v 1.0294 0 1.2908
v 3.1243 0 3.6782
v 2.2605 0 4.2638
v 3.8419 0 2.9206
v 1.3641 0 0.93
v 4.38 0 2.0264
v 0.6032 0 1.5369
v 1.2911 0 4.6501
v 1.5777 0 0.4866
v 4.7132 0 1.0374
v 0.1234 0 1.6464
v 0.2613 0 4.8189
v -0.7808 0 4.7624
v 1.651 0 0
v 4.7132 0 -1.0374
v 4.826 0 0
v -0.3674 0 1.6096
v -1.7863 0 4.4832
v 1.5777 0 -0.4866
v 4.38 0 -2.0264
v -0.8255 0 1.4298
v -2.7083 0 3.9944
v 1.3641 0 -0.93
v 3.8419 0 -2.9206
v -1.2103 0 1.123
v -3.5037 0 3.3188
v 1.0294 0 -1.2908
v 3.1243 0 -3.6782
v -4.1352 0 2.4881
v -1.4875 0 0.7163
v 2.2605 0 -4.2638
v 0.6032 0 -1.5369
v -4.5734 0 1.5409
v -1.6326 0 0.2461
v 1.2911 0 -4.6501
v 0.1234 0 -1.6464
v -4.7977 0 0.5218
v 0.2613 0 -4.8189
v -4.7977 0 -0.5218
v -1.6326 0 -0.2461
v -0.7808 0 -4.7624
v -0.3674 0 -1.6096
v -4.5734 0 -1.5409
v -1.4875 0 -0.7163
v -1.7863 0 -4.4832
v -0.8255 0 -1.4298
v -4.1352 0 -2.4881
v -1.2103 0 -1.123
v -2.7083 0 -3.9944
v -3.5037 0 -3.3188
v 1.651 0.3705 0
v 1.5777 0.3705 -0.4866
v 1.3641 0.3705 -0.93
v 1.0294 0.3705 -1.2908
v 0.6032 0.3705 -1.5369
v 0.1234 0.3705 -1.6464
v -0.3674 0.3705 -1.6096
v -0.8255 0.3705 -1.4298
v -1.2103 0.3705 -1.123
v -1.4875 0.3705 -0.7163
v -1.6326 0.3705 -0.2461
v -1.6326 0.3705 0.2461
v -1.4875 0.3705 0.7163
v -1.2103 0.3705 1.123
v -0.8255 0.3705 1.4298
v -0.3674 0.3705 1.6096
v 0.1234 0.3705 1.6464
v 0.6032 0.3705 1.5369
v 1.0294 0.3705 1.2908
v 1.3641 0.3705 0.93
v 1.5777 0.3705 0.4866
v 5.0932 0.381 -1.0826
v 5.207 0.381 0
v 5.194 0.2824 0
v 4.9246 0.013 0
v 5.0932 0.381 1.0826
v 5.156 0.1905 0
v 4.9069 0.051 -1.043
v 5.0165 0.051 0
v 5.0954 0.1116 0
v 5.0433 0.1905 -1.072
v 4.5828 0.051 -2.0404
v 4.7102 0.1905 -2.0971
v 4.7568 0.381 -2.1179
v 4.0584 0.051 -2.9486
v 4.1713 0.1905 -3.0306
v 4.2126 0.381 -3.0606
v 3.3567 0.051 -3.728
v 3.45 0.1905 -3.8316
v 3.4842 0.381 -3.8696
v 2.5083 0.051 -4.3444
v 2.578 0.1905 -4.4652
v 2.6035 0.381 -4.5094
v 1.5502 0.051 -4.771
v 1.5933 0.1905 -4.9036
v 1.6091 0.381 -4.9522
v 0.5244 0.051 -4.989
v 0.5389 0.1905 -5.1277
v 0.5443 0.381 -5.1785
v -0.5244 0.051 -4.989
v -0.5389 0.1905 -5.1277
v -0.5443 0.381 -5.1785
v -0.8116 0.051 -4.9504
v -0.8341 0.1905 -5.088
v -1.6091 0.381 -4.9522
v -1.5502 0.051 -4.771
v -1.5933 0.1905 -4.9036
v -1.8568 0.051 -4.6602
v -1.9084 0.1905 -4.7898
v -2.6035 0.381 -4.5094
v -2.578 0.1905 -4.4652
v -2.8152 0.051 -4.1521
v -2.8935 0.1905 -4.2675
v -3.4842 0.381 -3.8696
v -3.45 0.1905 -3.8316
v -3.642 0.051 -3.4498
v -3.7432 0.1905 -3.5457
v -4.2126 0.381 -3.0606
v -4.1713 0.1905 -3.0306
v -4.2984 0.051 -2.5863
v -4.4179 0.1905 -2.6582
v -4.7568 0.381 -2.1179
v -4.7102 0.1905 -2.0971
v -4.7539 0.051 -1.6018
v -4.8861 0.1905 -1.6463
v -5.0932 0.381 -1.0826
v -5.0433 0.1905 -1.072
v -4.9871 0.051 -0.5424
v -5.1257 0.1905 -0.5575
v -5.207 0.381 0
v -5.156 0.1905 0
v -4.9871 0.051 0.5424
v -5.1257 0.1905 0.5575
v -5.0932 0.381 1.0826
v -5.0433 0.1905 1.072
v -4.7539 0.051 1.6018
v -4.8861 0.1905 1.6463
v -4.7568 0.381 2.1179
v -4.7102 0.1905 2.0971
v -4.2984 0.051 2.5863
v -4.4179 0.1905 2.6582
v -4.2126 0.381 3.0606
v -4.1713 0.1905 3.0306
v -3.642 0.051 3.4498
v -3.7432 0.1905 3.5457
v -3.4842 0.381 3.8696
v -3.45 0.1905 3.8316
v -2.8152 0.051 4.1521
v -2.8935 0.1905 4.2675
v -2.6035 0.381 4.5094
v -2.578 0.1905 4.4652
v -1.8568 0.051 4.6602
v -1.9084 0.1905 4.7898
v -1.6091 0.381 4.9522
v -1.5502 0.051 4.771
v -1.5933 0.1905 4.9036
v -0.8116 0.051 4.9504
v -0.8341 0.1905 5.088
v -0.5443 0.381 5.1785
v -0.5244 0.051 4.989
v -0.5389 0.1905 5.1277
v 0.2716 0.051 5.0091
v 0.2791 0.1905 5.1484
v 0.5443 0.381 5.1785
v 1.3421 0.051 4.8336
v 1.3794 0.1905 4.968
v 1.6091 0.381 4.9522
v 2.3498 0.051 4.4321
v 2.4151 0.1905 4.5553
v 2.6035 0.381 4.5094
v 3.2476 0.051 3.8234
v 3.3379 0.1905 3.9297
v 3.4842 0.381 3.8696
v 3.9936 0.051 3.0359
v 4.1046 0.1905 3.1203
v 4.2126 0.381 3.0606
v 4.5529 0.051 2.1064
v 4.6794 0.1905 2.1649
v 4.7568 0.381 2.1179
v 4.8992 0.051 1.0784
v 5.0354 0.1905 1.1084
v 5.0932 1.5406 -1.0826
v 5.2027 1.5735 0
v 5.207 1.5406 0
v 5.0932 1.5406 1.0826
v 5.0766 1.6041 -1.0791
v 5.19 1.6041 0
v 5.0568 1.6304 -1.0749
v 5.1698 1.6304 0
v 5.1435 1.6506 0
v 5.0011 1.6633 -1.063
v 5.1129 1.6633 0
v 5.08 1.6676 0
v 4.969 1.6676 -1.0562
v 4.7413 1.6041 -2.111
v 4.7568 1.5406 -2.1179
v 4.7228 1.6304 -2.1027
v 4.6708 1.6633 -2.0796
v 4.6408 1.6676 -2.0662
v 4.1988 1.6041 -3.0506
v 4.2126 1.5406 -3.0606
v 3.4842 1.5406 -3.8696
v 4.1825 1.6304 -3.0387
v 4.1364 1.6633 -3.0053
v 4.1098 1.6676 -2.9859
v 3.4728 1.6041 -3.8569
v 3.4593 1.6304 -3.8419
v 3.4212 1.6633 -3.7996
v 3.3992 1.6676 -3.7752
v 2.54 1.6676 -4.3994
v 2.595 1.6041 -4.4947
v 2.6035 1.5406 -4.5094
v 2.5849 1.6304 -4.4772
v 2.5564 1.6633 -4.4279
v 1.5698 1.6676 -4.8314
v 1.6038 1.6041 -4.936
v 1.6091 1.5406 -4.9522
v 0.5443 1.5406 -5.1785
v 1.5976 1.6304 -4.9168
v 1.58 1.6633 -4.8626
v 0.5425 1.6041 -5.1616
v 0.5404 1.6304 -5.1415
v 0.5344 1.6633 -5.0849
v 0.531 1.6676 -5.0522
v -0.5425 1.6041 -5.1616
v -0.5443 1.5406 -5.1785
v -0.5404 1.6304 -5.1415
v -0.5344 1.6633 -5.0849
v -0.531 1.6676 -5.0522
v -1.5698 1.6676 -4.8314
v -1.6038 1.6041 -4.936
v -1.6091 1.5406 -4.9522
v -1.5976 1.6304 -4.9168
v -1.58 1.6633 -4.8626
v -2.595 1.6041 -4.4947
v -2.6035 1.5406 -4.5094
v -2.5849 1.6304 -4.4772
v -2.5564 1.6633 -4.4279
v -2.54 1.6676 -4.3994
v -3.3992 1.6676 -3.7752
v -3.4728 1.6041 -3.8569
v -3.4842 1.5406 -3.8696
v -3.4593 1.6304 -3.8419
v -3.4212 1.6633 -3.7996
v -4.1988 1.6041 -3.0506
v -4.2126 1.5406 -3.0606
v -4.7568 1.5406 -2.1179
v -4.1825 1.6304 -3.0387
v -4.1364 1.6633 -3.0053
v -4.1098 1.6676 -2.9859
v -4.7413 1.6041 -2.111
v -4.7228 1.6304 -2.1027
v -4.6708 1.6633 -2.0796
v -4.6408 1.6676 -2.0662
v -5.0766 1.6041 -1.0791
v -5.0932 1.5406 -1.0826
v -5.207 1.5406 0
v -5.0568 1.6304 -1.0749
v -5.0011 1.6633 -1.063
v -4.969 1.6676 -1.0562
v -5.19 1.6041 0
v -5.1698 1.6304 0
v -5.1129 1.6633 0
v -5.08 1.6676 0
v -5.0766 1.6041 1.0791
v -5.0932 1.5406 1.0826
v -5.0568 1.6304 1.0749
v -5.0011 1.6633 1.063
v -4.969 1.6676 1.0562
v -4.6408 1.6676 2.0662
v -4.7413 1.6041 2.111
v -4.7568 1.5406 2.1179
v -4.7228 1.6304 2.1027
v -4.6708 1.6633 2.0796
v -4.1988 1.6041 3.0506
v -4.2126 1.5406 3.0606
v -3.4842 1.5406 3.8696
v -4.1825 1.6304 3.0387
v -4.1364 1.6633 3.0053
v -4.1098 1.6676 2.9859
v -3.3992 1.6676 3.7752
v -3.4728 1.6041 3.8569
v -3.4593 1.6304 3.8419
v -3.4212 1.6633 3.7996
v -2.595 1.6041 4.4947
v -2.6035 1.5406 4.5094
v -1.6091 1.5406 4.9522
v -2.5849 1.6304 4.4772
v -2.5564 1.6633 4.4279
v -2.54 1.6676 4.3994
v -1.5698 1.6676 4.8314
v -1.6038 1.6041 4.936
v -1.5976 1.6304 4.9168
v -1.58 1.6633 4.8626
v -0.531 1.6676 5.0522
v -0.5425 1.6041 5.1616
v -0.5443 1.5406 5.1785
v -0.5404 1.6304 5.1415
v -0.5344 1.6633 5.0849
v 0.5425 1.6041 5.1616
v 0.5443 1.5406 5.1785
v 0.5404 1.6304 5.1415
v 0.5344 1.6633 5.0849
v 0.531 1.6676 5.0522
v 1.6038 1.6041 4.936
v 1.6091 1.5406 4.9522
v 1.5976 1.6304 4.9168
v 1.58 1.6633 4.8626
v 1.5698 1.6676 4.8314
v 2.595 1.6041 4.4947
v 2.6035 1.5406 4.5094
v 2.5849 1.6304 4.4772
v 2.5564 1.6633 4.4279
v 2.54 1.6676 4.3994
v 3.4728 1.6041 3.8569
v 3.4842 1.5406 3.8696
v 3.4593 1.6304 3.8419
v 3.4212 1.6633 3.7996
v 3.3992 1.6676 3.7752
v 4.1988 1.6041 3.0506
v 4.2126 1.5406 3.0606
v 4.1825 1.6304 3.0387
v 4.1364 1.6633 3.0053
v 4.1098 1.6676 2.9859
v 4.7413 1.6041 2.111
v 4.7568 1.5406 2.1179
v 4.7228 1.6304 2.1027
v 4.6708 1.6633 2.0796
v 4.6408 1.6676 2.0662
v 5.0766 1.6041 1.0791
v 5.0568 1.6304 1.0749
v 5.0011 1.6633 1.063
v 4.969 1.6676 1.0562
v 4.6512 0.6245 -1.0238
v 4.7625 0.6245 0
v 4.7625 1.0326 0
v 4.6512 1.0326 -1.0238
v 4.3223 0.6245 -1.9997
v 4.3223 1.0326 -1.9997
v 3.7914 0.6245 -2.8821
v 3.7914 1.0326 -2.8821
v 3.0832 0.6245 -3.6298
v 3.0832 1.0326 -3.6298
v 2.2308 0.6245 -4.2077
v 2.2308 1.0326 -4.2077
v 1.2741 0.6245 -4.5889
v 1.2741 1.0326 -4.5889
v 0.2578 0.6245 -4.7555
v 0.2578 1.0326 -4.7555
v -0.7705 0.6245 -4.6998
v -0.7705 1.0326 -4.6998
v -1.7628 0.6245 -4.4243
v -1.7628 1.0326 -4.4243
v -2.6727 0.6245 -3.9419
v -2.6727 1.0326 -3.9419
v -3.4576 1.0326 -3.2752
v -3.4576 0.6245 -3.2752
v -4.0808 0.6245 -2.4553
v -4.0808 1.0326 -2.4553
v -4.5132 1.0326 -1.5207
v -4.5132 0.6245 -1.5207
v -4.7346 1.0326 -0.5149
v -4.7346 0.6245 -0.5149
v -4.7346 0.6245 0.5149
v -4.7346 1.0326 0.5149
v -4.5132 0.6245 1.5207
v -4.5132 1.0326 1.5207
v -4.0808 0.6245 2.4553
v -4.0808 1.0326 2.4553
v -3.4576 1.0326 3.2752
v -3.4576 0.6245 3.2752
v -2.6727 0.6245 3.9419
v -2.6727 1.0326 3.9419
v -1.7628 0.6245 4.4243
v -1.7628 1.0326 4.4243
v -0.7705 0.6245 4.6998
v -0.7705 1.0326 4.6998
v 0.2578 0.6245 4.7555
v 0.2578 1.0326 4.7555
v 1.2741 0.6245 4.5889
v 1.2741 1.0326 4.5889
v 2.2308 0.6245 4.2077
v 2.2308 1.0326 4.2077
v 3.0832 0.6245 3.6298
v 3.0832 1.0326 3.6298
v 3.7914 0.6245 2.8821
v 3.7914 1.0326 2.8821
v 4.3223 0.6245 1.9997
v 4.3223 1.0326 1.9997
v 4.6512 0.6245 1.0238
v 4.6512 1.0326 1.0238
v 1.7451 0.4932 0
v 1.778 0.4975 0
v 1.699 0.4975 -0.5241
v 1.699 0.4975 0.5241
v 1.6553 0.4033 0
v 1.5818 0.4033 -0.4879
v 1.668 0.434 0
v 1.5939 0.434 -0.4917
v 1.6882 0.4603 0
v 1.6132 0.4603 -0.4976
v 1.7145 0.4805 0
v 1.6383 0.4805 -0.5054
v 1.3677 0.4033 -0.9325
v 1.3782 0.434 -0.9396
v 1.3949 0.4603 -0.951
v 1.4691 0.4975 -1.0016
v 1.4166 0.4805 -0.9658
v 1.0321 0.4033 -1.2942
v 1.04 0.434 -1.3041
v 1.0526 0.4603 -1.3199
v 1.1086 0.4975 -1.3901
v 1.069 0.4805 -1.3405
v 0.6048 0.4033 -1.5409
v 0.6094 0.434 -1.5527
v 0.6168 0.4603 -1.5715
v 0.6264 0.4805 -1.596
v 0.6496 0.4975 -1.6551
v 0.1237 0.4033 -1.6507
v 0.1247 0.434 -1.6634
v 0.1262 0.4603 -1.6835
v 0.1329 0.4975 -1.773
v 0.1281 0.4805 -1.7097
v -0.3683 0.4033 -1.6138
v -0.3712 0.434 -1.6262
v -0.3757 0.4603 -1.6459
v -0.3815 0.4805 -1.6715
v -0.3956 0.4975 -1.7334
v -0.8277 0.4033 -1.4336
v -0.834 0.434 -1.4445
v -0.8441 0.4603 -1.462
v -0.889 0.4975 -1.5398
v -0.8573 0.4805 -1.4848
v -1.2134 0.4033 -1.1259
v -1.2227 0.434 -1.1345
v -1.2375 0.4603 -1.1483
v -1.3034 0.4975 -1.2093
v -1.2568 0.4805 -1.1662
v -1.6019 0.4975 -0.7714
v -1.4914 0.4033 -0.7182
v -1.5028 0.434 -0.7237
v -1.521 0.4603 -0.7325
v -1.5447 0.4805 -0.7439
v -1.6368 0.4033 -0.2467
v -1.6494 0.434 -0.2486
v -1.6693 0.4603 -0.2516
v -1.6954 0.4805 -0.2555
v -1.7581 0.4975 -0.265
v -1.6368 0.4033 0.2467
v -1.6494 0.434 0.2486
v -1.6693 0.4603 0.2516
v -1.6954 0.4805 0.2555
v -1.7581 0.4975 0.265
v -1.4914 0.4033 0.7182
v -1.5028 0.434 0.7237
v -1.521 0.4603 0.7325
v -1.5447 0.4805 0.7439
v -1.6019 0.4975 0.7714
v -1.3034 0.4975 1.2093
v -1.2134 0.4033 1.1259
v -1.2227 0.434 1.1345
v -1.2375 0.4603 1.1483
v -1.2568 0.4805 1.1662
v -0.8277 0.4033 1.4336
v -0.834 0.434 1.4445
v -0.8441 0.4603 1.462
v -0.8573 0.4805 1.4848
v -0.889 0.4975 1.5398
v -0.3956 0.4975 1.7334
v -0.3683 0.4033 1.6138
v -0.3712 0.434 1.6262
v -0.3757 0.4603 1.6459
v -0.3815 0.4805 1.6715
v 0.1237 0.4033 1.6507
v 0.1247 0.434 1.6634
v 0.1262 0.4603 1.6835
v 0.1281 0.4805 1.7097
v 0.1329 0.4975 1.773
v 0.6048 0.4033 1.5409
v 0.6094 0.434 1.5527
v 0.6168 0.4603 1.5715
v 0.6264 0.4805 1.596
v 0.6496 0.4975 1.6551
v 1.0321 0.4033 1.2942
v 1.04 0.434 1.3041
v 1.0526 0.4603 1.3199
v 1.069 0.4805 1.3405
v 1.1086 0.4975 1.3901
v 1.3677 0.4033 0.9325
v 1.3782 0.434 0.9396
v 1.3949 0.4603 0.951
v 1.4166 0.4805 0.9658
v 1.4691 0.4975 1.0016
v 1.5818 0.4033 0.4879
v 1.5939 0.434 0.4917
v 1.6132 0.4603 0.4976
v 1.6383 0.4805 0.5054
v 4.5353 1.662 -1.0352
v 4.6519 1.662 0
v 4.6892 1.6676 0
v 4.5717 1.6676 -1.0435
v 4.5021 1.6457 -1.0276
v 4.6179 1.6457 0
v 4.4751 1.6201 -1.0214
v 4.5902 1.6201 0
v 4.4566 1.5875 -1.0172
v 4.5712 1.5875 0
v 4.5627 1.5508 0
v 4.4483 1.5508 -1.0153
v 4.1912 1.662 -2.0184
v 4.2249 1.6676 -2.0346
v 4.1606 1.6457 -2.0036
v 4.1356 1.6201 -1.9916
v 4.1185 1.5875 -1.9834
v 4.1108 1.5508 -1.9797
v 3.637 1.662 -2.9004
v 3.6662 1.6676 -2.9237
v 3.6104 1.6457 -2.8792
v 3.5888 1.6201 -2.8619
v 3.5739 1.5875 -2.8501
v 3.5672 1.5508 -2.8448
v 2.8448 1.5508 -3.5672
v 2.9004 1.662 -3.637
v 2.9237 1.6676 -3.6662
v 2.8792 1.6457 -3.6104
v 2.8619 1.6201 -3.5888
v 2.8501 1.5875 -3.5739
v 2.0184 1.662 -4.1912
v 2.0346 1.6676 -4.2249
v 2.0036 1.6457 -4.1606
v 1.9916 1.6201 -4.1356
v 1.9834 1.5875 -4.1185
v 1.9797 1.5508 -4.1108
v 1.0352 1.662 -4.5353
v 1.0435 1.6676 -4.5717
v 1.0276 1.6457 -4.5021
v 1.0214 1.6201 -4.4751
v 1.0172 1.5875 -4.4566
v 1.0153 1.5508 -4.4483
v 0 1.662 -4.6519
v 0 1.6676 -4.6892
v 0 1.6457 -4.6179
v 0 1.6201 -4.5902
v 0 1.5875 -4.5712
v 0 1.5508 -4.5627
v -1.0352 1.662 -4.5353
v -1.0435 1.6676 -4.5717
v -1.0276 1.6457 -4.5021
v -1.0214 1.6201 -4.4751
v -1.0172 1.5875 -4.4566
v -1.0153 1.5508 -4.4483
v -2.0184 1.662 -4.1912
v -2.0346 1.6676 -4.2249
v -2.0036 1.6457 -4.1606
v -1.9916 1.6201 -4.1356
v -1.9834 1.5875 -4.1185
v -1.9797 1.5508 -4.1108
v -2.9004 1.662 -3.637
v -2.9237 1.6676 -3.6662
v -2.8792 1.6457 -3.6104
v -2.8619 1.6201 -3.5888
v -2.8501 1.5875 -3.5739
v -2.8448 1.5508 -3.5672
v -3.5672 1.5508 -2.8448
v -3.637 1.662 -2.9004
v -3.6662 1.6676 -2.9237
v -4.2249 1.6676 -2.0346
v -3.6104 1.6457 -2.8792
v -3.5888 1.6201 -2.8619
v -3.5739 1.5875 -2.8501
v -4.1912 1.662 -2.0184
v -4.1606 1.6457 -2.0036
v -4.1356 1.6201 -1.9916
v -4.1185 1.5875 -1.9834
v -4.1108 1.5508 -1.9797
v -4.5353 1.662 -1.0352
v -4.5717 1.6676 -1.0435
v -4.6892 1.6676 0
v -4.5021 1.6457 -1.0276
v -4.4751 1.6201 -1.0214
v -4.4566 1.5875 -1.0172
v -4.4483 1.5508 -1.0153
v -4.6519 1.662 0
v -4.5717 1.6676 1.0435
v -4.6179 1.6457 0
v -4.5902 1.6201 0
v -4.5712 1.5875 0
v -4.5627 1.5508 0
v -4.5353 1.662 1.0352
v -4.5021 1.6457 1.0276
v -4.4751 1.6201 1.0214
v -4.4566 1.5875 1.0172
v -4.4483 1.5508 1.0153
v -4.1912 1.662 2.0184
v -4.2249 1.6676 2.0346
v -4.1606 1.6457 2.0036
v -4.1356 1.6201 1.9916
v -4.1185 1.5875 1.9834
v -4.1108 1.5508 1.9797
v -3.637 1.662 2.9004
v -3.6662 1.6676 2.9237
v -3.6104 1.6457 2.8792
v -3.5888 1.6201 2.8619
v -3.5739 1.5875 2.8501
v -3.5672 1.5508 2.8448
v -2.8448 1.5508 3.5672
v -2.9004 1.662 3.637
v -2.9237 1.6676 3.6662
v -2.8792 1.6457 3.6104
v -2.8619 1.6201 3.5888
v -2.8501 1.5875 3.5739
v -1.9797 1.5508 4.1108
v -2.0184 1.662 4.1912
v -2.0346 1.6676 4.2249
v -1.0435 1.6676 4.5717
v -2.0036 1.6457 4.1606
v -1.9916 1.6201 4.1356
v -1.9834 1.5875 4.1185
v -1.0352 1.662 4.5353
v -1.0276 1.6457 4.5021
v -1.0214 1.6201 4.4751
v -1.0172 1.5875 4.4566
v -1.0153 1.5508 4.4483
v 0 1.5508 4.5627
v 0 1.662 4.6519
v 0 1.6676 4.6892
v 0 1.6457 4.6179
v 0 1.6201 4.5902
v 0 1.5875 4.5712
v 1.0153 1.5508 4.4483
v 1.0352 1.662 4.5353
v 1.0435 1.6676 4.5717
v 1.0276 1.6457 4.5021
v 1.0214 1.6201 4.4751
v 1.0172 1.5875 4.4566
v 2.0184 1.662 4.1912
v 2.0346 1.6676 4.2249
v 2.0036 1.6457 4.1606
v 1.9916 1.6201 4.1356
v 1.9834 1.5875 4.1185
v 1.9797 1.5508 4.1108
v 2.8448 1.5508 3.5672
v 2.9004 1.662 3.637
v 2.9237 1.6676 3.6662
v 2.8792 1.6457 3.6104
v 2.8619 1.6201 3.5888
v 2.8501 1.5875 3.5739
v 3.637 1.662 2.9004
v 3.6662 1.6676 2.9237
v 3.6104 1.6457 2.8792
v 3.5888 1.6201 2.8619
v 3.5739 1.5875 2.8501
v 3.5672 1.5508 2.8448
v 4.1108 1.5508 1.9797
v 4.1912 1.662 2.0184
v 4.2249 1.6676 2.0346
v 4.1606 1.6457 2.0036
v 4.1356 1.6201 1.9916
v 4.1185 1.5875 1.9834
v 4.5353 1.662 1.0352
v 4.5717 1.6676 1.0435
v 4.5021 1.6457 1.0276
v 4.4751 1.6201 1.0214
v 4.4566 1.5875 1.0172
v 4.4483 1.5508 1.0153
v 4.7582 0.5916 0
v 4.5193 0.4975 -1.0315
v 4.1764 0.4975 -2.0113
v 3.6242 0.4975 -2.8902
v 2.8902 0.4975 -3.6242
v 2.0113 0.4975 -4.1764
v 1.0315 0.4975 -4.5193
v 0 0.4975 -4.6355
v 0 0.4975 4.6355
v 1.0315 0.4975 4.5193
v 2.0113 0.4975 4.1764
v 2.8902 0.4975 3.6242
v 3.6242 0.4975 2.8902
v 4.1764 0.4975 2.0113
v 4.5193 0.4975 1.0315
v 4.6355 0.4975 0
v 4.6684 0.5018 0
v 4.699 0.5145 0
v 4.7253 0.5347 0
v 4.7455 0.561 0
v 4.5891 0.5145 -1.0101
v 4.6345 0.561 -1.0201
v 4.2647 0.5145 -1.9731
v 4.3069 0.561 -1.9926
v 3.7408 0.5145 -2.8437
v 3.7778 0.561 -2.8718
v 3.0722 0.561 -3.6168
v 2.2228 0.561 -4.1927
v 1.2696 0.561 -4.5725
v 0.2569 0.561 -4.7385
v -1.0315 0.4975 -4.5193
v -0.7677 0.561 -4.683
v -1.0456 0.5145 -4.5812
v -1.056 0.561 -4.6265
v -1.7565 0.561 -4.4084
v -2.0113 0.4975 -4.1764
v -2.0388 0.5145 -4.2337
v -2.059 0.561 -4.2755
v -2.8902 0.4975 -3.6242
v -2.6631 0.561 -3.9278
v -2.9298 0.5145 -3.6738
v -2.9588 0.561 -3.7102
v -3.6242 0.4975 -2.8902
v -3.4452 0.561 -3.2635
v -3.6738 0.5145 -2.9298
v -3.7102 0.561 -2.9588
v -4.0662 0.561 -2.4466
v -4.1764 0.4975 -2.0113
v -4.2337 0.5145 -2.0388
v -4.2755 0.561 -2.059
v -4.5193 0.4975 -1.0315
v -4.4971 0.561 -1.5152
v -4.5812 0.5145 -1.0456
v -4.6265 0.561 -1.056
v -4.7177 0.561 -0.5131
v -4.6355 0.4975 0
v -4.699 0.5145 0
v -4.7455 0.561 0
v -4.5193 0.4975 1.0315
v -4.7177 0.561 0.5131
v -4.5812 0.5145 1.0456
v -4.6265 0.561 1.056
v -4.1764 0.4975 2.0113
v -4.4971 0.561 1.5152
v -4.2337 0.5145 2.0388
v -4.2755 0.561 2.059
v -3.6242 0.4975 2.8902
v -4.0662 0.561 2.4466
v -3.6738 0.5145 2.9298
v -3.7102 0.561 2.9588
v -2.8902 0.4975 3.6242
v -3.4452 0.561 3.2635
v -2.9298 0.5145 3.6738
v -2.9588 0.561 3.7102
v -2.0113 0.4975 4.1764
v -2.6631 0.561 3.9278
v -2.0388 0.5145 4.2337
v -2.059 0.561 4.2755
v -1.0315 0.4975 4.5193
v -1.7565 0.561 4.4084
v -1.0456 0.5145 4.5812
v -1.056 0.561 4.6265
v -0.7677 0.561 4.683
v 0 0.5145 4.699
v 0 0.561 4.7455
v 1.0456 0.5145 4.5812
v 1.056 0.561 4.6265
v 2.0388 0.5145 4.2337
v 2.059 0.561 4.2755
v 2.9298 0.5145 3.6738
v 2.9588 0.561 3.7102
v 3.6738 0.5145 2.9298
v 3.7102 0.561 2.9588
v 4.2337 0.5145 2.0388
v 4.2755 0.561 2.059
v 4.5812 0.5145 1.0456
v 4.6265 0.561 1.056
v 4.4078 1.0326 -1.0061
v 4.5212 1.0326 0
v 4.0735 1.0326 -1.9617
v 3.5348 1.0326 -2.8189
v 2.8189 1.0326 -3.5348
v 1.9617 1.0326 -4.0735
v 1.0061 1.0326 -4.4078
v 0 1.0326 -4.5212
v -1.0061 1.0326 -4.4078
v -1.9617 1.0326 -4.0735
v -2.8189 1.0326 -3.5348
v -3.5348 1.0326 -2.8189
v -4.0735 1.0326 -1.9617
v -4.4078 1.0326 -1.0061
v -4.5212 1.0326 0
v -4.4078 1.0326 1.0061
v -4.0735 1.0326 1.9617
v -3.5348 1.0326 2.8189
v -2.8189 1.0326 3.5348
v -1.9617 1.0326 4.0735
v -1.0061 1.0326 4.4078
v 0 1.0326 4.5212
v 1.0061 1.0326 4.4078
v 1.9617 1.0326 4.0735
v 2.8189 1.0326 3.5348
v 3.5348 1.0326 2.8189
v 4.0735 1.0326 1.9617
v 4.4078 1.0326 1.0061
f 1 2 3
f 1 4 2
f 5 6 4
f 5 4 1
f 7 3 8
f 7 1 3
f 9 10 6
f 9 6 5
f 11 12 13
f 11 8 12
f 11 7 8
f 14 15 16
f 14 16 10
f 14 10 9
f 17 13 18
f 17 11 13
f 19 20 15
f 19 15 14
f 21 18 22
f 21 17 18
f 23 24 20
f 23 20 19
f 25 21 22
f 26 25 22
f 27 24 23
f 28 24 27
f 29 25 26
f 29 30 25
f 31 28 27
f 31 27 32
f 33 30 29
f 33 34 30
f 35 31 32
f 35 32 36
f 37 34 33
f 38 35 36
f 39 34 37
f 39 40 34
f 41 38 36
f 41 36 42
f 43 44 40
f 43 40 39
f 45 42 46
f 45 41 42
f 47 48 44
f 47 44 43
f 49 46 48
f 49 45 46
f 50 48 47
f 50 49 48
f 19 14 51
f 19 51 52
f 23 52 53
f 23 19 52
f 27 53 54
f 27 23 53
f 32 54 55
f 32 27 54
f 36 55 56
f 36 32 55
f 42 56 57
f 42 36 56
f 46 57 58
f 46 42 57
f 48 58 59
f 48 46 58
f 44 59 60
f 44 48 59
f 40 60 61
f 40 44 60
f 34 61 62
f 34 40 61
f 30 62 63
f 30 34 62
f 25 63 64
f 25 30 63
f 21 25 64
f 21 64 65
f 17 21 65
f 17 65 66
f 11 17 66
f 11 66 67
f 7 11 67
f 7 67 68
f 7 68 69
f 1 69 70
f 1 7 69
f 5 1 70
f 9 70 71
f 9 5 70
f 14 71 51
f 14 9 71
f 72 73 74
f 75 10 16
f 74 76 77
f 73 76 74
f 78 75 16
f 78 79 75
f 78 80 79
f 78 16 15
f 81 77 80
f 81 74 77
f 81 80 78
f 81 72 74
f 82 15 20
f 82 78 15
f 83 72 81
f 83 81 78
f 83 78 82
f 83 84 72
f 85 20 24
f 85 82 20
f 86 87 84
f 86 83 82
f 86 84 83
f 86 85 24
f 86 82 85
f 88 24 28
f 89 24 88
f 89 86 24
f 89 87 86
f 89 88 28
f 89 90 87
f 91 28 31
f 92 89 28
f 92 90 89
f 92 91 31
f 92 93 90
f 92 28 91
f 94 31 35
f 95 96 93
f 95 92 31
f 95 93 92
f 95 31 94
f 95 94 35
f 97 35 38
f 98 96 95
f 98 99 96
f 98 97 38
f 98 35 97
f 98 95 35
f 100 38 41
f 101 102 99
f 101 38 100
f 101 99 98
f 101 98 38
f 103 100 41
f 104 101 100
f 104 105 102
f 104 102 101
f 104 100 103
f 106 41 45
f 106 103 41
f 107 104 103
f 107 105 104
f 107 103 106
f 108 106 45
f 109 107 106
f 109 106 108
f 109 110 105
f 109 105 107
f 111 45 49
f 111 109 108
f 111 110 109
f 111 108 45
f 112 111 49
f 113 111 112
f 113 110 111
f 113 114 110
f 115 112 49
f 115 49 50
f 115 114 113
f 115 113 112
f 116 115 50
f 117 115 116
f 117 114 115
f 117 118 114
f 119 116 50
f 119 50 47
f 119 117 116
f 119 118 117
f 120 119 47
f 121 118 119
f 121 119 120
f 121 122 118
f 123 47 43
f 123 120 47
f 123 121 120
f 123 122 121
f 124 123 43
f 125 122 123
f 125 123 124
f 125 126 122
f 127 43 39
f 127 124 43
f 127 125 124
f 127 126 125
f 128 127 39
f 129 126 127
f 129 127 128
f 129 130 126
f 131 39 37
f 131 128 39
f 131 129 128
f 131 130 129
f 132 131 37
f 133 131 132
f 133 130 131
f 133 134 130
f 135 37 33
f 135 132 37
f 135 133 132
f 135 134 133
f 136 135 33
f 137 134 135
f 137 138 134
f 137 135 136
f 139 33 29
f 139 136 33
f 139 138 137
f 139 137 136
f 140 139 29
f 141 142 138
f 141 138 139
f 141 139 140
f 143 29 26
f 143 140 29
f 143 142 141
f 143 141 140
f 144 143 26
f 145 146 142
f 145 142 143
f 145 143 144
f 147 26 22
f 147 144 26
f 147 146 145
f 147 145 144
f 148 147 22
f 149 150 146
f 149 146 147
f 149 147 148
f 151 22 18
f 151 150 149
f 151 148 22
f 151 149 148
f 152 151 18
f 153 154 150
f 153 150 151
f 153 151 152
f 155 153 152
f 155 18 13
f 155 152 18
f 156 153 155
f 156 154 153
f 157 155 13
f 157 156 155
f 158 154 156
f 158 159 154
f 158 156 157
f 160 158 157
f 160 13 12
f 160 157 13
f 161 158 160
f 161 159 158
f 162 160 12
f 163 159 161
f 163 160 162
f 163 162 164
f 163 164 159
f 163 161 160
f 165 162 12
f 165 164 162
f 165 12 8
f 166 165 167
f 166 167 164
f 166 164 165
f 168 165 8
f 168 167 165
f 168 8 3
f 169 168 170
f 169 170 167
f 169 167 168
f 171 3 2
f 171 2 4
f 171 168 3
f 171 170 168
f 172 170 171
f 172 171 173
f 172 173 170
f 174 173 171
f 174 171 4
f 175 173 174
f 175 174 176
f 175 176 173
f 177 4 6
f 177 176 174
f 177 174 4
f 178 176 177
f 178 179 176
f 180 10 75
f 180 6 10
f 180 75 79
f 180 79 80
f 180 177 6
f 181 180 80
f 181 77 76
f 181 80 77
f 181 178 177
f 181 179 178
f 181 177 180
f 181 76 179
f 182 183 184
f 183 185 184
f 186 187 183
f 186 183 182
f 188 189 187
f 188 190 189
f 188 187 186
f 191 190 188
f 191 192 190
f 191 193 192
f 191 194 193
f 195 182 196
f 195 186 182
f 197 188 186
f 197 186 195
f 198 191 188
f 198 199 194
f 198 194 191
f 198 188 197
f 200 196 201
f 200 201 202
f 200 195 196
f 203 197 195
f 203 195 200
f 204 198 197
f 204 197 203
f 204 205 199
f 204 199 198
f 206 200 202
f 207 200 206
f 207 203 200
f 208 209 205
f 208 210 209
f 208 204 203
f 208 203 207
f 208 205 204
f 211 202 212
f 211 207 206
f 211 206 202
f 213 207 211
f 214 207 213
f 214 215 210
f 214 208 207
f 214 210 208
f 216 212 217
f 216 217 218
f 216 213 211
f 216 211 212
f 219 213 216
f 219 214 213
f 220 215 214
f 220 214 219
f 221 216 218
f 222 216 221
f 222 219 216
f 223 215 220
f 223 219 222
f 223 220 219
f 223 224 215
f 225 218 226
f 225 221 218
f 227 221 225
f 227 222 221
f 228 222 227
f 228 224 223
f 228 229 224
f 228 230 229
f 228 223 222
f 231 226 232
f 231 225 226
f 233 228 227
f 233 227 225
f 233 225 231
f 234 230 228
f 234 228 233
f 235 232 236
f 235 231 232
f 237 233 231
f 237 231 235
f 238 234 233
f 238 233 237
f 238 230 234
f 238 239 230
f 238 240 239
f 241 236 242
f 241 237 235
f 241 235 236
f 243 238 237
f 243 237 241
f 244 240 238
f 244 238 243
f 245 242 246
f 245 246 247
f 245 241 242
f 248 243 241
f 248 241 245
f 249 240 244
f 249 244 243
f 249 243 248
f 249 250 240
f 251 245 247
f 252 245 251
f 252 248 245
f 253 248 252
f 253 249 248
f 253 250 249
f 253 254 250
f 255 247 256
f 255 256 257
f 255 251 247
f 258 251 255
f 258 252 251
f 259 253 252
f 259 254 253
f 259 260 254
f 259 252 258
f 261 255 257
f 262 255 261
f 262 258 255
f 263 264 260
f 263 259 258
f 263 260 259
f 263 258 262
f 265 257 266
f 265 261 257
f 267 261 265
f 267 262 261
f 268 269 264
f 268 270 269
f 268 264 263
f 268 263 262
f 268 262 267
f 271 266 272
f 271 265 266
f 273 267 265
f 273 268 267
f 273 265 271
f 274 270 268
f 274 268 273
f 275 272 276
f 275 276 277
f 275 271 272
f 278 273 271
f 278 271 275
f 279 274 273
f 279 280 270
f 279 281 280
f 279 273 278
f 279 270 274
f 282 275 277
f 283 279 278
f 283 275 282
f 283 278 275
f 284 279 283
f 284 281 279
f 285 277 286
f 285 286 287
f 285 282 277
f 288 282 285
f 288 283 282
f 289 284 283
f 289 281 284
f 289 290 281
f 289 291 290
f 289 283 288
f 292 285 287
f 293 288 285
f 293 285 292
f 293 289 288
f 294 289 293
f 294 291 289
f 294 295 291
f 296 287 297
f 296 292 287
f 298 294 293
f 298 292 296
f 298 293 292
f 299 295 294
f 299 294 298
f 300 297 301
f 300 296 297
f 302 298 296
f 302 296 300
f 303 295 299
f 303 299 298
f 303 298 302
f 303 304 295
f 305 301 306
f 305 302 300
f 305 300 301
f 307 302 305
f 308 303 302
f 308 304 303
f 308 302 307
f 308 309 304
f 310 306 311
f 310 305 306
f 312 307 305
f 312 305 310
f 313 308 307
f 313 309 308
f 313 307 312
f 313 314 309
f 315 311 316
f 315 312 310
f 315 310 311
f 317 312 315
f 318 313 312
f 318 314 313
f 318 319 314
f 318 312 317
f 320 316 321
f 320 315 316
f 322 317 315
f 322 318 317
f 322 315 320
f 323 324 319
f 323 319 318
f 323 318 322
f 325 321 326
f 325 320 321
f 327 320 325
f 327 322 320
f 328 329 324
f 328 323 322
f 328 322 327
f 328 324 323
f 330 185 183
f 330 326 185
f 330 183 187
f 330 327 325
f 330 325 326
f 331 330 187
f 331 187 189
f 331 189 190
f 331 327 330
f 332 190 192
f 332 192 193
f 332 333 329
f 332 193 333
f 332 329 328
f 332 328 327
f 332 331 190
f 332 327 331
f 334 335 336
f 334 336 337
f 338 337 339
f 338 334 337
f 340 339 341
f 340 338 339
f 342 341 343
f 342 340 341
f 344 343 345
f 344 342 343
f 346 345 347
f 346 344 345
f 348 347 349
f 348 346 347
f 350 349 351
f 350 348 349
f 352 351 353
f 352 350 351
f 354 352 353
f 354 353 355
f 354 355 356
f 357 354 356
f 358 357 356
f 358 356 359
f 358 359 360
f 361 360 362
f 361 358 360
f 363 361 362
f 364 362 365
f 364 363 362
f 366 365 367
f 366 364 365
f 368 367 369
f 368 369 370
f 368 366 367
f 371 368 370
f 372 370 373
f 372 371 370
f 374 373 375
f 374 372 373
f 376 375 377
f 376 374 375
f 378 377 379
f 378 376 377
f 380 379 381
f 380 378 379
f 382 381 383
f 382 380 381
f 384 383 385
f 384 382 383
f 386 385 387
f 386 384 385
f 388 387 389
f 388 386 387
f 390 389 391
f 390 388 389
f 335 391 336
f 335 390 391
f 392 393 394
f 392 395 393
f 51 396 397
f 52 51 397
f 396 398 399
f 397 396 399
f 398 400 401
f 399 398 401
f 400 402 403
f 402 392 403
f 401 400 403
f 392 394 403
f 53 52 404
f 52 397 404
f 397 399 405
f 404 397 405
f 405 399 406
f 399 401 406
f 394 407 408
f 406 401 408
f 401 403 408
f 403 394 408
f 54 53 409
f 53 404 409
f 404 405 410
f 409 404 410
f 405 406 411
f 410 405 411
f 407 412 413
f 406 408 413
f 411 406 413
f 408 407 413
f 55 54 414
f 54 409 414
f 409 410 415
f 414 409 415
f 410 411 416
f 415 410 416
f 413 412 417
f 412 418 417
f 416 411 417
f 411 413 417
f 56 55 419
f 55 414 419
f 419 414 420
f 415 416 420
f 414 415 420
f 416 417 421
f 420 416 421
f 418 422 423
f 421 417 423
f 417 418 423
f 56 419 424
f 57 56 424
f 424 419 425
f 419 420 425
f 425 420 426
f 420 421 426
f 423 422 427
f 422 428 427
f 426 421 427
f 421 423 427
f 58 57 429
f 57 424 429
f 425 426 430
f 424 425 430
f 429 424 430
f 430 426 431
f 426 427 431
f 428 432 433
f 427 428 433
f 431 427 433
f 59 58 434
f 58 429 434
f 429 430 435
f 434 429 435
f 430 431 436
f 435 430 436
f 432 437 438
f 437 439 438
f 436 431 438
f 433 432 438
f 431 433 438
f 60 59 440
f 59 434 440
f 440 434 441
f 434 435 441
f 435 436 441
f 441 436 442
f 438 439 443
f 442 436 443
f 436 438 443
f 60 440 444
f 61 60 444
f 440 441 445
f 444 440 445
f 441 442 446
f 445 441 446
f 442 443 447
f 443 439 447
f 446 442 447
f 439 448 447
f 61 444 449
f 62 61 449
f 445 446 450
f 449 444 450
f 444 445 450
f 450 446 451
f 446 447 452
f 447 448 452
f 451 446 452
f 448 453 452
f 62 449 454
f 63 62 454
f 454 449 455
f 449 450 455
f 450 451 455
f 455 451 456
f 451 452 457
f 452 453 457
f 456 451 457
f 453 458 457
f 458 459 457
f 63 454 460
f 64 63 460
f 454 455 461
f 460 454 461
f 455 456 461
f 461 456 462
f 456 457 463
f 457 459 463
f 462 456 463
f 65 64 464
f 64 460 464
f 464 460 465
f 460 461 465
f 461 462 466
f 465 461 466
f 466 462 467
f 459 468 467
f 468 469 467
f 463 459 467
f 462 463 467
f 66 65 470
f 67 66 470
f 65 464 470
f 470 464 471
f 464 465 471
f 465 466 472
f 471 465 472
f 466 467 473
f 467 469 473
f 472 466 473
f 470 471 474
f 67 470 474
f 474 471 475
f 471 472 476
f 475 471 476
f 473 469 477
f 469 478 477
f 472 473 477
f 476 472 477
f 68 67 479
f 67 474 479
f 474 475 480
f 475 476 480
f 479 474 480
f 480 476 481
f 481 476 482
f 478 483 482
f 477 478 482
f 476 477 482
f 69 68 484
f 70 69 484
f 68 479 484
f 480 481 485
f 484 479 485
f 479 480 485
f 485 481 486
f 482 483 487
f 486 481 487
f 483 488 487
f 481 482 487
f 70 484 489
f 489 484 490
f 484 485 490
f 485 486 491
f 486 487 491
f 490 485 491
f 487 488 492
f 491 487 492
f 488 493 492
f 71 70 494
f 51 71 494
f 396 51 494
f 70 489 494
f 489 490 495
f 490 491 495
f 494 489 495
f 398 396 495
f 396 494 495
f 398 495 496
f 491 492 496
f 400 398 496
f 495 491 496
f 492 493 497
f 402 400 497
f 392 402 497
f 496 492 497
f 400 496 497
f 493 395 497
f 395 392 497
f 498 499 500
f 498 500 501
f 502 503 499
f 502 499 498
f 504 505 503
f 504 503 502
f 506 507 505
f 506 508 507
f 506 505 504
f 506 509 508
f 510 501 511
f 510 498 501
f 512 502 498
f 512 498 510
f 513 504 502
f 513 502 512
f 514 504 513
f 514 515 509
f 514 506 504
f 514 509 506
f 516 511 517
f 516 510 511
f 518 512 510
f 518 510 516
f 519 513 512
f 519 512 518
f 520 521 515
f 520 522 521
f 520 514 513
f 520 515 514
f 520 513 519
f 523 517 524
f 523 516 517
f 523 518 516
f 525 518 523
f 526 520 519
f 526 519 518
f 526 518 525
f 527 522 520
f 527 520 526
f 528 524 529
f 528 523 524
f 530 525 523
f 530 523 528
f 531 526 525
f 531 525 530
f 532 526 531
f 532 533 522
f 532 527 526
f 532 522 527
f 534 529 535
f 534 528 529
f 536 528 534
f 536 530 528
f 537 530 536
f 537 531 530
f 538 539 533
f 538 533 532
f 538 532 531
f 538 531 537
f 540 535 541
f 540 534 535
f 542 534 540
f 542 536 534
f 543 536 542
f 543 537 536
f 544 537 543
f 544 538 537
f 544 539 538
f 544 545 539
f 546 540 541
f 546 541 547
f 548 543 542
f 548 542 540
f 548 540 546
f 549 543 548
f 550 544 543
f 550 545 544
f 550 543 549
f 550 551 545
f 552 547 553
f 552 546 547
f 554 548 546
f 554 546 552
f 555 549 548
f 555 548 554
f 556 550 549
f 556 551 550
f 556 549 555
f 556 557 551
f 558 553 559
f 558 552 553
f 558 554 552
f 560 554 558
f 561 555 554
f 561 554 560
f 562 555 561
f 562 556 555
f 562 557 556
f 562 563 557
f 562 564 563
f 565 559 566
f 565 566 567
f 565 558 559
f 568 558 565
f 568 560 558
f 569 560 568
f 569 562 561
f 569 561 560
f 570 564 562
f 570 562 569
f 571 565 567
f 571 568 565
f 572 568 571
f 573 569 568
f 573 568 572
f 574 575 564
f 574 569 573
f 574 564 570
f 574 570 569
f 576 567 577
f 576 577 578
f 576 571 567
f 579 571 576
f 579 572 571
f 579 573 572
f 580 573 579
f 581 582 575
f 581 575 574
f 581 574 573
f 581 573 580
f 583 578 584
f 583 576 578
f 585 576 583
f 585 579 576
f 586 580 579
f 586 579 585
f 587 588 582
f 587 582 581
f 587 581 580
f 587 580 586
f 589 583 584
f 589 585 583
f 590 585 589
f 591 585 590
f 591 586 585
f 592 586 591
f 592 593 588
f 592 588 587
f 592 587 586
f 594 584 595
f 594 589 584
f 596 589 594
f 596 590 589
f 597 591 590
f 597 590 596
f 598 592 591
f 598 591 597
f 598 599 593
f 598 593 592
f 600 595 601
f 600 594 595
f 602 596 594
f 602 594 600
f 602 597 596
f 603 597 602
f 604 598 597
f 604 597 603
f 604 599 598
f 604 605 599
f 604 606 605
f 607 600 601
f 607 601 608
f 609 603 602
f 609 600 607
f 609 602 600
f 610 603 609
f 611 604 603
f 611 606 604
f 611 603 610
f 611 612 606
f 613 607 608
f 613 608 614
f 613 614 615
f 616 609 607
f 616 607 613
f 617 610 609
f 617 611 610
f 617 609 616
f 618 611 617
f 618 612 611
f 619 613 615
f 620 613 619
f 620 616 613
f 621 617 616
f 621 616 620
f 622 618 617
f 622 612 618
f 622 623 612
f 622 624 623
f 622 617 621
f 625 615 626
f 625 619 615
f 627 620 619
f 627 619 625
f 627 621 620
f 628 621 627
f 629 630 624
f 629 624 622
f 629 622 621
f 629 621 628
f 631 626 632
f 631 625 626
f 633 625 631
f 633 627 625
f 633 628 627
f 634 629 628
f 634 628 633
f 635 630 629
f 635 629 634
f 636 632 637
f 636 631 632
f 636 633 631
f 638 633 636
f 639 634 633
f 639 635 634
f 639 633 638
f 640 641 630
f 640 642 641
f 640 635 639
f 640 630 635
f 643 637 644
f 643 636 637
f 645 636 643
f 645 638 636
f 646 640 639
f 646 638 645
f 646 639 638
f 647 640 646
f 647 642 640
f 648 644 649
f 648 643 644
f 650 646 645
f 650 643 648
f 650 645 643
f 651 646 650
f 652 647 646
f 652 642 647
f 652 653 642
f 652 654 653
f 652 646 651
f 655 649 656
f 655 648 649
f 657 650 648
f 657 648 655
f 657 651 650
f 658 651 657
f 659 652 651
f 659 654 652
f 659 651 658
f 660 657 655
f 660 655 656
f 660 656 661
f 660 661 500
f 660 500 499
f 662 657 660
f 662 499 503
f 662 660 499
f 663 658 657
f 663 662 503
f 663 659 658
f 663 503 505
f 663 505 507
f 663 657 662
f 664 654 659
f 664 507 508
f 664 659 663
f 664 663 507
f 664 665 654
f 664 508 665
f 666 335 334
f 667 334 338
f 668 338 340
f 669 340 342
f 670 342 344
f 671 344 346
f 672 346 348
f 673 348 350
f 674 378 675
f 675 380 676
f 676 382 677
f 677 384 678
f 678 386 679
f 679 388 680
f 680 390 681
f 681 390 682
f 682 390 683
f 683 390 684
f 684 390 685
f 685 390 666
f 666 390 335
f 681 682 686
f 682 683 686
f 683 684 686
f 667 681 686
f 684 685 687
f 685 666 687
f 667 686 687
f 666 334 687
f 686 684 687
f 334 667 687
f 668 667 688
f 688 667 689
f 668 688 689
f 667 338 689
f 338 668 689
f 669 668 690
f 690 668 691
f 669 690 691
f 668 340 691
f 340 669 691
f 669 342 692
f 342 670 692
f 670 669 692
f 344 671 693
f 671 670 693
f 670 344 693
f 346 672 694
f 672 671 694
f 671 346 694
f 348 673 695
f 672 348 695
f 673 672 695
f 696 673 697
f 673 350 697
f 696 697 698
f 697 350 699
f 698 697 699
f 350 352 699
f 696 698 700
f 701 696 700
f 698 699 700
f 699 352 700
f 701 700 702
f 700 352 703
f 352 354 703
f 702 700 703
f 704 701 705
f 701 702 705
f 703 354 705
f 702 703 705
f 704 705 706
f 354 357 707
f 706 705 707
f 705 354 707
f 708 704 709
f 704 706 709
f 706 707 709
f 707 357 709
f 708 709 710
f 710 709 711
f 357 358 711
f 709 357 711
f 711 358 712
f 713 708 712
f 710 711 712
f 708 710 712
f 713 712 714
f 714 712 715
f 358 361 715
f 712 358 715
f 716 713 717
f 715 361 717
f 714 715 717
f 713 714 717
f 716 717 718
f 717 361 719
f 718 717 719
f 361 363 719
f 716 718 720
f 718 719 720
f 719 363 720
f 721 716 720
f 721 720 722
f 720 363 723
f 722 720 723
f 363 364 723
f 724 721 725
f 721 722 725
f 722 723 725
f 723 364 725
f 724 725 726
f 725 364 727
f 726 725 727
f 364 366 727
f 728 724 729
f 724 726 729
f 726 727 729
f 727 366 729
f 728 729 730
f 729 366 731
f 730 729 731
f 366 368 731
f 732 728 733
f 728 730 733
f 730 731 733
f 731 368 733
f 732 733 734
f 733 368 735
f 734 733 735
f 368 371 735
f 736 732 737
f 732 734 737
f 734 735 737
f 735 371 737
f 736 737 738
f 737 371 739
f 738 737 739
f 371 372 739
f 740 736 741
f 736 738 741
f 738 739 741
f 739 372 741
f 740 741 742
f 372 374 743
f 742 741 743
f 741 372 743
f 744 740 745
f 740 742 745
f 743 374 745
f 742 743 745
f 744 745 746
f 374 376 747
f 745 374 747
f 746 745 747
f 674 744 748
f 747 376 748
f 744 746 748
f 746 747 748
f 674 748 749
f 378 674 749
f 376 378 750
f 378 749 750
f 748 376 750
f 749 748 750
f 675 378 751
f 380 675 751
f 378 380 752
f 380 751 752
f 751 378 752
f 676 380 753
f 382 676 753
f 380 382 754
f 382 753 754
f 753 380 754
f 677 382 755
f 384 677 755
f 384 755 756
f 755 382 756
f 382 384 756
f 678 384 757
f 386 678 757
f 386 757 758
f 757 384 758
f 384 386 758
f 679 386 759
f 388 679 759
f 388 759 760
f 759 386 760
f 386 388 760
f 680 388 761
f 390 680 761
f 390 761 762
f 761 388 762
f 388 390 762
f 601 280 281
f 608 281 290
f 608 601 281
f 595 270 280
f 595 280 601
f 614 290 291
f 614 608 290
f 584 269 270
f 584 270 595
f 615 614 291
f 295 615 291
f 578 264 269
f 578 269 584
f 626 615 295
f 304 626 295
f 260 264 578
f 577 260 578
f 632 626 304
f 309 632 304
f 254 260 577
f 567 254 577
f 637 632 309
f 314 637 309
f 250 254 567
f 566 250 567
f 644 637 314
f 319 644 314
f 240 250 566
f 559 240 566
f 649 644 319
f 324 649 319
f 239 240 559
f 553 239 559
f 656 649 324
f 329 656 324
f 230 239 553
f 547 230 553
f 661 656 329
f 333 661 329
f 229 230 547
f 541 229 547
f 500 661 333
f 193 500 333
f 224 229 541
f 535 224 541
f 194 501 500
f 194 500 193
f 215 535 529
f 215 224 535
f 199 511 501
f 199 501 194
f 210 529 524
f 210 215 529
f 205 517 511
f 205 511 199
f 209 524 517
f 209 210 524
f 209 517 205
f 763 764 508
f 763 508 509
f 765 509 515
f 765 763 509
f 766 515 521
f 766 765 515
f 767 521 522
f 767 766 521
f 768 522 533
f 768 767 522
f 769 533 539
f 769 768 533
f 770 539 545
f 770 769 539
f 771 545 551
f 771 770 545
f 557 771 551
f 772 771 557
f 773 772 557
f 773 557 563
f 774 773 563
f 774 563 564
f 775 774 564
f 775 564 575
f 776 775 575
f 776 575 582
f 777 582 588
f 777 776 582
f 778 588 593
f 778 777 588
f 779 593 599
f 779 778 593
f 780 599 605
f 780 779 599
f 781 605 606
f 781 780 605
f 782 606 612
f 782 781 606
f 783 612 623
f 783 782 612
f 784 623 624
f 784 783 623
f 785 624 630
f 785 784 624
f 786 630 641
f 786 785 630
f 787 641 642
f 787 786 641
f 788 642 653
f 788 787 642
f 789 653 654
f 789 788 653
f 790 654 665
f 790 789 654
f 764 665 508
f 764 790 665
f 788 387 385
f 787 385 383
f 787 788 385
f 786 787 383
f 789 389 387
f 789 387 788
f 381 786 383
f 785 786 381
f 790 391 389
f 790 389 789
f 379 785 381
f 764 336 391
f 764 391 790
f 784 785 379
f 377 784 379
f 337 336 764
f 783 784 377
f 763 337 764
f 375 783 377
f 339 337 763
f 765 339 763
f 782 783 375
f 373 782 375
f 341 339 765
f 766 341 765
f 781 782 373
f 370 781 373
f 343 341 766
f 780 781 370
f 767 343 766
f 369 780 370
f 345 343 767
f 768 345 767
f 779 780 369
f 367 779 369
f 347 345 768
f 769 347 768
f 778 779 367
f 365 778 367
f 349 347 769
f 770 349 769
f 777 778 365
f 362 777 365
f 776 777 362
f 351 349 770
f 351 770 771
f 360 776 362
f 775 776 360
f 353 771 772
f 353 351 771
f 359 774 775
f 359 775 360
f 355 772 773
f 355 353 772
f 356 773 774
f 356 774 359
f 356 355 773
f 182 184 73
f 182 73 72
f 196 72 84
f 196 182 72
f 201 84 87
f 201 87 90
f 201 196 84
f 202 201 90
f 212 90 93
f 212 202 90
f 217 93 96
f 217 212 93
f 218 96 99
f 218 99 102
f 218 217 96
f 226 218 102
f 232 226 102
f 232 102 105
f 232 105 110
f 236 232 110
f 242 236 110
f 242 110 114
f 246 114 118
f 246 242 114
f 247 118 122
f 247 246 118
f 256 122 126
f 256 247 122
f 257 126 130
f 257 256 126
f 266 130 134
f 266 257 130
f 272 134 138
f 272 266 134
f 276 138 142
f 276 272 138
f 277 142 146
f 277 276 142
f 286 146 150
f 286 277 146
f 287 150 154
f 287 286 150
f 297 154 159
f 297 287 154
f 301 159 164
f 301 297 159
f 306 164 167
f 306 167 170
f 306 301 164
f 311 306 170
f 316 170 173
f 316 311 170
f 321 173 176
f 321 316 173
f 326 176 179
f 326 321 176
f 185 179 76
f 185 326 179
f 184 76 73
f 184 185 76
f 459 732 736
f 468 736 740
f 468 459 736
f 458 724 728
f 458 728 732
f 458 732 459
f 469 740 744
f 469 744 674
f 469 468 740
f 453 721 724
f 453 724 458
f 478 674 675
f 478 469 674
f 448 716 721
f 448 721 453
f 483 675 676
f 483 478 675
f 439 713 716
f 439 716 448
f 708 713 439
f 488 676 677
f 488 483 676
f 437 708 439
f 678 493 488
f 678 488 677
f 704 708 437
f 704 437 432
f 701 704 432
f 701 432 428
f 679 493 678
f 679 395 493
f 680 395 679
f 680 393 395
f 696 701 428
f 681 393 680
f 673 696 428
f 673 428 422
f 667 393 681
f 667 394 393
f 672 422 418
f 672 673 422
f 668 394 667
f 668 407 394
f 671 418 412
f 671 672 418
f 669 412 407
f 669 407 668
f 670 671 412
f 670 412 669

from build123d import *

# Parameters (mm, degrees)
FILLET1_R = 0.381
FILLET2_R = 0.127


with BuildPart() as part:
    # Sketch1 → Revolve1 (revolve)
    with BuildSketch(Plane.XY):
        Polygon((1.651, 0), (5.207, 0), (5.207, 1.667634761), (4.572, 1.667634761), (4.5212, 1.032634761), (4.7625, 1.032634761), (4.7625, 0.49747982), (1.651, 0.49747982), align=None)
    revolve(axis=Axis((0, -34.221434911, 0), (0, 1, 0)))

    # Fillet1
    fillet1_edges = [part.edges().sort_by_distance(p)[0] for p in [
        (-5.207, 0, 0),
    ]]
    fillet(fillet1_edges, radius=FILLET1_R)

    # Fillet2
    fillet2_edges = [part.edges().sort_by_distance(p)[0] for p in [
        (-1.651, 0.49747982, 0),
        (-4.7625, 0.49747982, 0),
        (-4.572, 1.667634761, 0),
        (-5.207, 1.667634761, 0),
    ]]
    fillet(fillet2_edges, radius=FILLET2_R)


solid = part.part
